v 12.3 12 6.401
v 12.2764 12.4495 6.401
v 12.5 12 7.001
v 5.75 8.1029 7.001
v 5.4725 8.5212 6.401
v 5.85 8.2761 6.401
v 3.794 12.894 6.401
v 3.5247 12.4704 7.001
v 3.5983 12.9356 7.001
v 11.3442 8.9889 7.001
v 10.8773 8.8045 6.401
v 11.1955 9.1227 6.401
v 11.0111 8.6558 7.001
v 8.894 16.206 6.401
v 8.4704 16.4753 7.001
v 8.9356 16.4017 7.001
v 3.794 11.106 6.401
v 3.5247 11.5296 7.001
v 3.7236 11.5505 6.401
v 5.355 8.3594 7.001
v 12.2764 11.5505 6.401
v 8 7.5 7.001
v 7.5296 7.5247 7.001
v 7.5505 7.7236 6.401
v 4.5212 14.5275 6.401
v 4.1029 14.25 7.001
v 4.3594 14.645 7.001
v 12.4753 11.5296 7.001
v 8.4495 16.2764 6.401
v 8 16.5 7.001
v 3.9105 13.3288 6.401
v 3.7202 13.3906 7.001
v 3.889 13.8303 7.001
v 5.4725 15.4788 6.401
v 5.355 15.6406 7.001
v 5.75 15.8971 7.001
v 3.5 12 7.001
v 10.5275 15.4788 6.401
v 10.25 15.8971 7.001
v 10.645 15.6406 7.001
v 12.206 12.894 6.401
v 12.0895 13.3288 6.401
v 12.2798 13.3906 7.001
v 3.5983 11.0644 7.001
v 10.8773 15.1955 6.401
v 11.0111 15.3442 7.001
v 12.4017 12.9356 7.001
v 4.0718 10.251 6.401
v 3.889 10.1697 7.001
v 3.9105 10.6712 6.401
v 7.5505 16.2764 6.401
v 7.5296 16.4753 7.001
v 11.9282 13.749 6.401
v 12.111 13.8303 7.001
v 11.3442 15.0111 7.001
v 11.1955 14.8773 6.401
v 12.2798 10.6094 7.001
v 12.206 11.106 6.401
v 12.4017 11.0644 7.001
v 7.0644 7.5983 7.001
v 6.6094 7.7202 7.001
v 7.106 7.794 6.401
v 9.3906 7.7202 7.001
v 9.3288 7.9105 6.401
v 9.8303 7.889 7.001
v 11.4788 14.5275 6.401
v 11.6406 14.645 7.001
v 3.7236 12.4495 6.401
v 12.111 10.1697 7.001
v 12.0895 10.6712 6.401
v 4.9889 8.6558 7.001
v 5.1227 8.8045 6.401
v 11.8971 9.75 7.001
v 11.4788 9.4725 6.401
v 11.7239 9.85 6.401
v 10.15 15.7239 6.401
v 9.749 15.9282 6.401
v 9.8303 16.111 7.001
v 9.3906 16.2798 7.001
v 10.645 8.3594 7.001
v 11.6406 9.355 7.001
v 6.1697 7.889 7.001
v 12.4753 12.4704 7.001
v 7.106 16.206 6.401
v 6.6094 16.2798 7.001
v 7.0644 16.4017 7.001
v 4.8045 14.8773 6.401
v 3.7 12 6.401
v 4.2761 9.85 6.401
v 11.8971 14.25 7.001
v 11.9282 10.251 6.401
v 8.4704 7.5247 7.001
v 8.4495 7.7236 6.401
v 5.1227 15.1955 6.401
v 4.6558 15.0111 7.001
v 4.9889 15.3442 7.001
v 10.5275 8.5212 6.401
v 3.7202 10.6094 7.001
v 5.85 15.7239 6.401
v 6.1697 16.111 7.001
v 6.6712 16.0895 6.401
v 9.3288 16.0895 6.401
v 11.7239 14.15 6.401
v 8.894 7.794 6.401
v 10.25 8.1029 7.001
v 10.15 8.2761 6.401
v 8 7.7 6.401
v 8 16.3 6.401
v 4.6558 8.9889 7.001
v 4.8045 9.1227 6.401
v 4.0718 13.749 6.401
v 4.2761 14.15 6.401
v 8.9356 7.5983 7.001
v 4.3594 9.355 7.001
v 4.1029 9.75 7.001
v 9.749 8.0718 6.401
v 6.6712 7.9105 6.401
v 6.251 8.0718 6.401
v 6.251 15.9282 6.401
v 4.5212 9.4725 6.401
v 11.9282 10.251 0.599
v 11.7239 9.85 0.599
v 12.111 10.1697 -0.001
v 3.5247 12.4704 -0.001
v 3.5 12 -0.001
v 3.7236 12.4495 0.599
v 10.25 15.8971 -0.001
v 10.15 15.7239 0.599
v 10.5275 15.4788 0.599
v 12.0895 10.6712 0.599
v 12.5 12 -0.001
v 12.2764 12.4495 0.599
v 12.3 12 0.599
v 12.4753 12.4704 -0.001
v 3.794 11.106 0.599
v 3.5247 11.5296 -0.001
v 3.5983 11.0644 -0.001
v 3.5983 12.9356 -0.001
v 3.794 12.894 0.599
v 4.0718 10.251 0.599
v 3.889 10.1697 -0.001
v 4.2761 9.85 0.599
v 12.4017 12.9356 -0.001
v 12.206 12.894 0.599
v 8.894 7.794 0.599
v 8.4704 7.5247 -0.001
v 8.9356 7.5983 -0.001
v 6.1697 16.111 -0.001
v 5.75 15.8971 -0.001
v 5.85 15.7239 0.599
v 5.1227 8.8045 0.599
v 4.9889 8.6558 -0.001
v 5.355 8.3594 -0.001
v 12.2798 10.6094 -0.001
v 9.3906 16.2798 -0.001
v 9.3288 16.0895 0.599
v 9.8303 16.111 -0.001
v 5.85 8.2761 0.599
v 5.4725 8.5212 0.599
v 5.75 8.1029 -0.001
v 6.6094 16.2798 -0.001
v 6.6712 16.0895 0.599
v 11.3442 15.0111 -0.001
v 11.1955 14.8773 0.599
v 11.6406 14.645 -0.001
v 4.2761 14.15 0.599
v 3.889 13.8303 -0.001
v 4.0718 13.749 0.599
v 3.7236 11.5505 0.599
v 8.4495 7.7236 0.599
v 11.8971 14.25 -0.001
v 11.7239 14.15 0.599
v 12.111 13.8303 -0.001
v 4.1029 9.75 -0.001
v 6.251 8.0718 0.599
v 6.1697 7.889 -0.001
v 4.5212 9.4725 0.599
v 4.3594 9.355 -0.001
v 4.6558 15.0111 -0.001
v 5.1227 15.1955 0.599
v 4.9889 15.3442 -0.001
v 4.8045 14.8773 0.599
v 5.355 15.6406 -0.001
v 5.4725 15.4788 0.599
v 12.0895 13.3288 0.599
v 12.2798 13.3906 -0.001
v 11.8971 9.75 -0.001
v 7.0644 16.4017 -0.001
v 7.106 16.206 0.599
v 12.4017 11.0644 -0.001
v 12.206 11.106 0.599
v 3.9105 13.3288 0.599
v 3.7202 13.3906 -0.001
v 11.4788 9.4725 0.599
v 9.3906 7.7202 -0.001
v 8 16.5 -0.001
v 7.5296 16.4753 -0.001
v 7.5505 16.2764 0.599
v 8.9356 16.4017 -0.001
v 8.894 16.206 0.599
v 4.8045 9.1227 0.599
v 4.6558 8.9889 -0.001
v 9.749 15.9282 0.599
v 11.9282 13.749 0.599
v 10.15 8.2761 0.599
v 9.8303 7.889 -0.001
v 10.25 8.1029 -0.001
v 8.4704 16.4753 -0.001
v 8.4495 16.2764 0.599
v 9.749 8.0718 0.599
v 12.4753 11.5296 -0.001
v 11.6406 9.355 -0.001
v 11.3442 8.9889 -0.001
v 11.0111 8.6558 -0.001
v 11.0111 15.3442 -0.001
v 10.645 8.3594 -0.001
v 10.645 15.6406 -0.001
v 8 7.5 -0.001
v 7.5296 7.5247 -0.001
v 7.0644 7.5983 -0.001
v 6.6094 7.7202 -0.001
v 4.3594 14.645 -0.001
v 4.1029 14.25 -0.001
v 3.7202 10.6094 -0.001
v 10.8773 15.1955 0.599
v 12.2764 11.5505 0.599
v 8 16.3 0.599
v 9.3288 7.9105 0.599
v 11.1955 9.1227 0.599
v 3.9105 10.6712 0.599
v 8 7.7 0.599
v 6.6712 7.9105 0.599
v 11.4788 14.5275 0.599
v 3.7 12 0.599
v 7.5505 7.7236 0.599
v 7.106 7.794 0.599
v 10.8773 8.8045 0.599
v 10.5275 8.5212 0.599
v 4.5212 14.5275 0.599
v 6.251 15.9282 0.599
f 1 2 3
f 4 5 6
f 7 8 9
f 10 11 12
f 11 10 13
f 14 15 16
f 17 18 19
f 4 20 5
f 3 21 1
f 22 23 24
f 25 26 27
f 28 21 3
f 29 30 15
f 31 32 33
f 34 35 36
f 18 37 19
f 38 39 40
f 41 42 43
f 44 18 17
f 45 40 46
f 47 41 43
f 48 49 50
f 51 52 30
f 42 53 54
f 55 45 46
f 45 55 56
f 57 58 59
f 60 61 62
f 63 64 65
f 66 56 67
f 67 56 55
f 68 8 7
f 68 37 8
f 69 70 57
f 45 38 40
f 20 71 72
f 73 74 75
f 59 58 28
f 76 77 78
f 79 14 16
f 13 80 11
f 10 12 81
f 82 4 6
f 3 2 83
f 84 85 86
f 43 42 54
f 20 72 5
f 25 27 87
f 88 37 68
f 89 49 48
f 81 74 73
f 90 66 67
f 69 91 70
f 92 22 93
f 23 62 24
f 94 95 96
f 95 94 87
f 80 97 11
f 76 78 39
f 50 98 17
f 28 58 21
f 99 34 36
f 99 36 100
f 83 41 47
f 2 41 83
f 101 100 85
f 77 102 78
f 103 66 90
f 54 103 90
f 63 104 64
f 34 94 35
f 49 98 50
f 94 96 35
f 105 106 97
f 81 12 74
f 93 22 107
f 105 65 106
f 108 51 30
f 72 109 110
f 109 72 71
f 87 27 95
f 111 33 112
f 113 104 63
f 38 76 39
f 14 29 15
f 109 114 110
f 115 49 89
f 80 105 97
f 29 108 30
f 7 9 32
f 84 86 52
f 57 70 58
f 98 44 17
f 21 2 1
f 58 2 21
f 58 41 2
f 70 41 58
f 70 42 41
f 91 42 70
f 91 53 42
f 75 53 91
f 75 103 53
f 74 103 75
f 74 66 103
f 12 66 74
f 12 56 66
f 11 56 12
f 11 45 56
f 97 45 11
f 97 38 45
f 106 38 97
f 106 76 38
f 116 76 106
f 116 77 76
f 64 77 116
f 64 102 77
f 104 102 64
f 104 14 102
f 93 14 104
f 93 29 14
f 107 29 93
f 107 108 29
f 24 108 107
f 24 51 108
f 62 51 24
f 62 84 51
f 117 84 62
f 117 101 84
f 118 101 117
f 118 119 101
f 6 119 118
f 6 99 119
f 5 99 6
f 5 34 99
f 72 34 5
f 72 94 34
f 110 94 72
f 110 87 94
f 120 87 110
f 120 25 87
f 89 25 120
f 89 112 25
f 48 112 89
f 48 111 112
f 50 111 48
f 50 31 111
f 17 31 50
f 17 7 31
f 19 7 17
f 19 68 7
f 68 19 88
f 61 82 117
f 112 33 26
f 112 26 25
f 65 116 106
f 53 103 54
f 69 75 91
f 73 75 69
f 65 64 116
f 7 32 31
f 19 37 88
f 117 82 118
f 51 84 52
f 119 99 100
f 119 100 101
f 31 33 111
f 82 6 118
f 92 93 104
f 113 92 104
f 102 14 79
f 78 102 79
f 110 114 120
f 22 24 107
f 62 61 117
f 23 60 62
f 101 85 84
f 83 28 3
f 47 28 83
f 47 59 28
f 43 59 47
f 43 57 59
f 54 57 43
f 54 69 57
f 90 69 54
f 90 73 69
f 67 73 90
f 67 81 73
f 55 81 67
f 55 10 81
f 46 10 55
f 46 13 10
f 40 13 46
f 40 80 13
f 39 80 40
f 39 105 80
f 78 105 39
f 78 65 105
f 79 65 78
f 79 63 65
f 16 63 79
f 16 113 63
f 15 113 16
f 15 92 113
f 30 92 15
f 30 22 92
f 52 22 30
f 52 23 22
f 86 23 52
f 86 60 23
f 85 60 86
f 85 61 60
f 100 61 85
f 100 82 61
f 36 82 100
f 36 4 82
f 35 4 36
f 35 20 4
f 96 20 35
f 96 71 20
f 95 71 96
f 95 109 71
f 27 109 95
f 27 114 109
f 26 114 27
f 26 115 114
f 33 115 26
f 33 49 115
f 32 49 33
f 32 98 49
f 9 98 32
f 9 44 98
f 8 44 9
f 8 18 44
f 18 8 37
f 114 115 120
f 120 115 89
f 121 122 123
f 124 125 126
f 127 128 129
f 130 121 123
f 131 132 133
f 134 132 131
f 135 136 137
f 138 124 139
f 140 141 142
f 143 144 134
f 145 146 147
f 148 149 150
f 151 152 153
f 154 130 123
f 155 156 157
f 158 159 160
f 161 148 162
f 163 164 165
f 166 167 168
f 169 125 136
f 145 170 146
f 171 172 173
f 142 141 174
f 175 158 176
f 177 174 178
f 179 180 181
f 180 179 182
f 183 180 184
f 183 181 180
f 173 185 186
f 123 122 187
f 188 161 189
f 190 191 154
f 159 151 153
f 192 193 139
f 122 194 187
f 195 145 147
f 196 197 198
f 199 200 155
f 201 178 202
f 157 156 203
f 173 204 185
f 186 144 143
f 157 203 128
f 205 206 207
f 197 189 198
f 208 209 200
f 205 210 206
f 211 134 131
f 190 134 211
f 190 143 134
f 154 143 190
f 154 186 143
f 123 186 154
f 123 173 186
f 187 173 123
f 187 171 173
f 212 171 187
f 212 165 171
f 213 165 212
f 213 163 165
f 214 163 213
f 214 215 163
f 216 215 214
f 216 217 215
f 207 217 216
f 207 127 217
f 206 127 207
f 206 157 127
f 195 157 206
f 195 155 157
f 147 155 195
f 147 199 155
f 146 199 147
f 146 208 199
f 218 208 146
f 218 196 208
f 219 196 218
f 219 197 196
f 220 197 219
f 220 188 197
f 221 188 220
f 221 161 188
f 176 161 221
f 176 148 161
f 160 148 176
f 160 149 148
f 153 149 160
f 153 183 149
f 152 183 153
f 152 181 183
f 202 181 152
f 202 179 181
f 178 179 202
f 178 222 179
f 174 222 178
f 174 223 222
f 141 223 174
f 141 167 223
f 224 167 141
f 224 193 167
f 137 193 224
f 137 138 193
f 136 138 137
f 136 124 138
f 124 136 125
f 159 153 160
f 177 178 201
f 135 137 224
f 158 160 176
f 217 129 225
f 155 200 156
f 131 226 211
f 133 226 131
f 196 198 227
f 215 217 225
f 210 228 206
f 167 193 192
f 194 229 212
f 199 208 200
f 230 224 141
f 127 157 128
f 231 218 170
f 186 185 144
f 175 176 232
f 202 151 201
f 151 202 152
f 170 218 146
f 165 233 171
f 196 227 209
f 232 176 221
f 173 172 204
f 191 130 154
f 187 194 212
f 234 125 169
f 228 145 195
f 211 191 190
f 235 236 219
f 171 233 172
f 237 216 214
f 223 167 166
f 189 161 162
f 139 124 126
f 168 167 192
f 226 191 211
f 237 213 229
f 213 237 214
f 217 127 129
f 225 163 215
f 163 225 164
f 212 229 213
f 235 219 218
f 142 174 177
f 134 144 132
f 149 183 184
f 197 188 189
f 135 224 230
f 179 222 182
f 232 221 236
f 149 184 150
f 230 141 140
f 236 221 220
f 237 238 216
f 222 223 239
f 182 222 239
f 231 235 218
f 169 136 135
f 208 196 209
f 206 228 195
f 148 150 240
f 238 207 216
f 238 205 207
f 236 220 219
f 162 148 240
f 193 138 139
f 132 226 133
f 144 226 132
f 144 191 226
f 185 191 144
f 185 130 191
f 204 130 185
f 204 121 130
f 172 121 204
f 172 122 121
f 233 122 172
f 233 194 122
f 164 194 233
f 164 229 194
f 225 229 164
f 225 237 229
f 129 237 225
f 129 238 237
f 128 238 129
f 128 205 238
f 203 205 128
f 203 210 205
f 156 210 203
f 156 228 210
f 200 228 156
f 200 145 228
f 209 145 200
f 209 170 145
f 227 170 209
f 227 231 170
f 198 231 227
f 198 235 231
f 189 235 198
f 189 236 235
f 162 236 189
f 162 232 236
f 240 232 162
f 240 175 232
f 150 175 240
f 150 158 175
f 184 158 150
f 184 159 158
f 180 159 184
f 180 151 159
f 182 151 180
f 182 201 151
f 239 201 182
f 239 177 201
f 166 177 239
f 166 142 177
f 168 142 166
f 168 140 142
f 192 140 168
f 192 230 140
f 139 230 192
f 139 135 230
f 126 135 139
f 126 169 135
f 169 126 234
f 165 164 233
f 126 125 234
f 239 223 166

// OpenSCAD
/*
"OpenScad library. Threads for screws and nuts V1" 
by ANDRES ROMAN (AKA Cuiso) September 2018

* Copyright 2018 ANDRES ROMAN (AKA Cuiso)
* Licensed under the Creative Commons - Attribution license.
* This software is free software, you can Share and Adapt under the terms of Attribution
(give appropriate credit).
*   
* you can visit https://creativecommons.org/licenses/by/3.0/ for more details

* This software is distributed WITHOUT ANY WARRANTY.

*/

//For use this library you can put the file threads-library-by-cuiso-v1.scad in the same directory of your proyect and put the line use <threads-library-by-cuiso-v1.scad> in your own .scad file
//You can see examples of use in file examples.scad

/*
This is a library to include threads for screws and nuts in your own designs.

This library is focused to provide simple functions with preset parameters by default,
and not to be too demanding in CPU consumption neither in previsualizacion nor in rendering

This library has been tested printing on PLA with 0.1 layer. Except for smaller diameter
threads layers greater than 0.1 should work well.
Diamaters tested between 3mm and 10mm, but you can use any diameter of your choice. 

Shape of the threads are similar (but not equal) to ISO METRIC threads.
Some tests have been done using screws and nuts printed with this library in
combination with screws and nuts of metal with acceptable results. However, they have
not been exhaustive tests.
*/

/*
>>>>>>>>>>>>>>>>>>>>>>>>>>>>>>>>>>>>>>>>>>>>>>>>>>>>>>
AVAILABLE FUNCTIONS:

BASIC FUNCTIONS (USING PREDEFINED PARAMETERS):

thread_for_screw(diameter, length);
    Generates a screw thread of the diameter indicated by the "diameter" parameter and of the length indicated by "length". This function uses standard pitch values depending on the diameter specified.
    diameter: Free value, in milimeters.
    length: Free value, in milimeters.
    
    Example:
    thread_for_screw(diameter=10, length=30);

module thread_for_nut(diameter, length, usrclearance=0);
    Generates a nut thread of the diameter indicated by the "diameter" parameter and of the length indicated by "length". This function uses standard pitch values depending on the diameter specified.
    The generated thread can be subtracted from any element of your design using the operator "difference()", thus obtaining a thread where a screw will fit.
    This function uses standard clearance for adjustment between screw and nut depending on the diameter specified.
    diameter: Free value, in milimeters.
    length: Free value, in milimeters.
    usrclearance: (optional) If the screw fits too tight on the nut you can specify a positive correction value (try 0.1 for example).
    If the screw fits too loose in the nut you can specify a negative correction value (try -0.1 for example).
    
    Example:
    thread_for_nut(diameter=10, length=20);
    

MORE AVAILABLE FUNCTIONS (WITH ADDITIONAL PARAMETERS):

thread_for_screw_fullparm(diameter, length, pitch, divs=50);
    Generates a screw thread of the diameter indicated by the "diameter" parameter and of the length indicated by "length", with pitch indicated by "pitch", and a resolution indicated by "divs". 
    This function allows you to specify a non-standard "pitch" value.
    diameter: Free value, in milimeters.
    length: Free value, in milimeters.
    pitch: Pitch value.
    divs: (optional) you can obtain more or less resolution with parm. Higher values for more resolution (and more rendering time). Default value is 50.
        
    Example:
    thread_for_screw_fullparm(diameter=10, length=30, pitch=2, divs=60);

thread_for_nut_fullparm(diameter, length, usrclearance=0, pitch, divs=50, entry=1);
    Generates a nut thread with additional parameters:
    diameter: Free value, in milimeters.
    length: Free value, in milimeters.
    usrclearance: (optional) If the screw fits too tight on the nut you can specify a positive correction value (try 0.1 for example).
    If the screw fits too loose in the nut you can specify a negative correction value (try -0.1 for example).
    pitch: Pitch value.
    divs: (optional) you can obtain more or less resolution with parm. Higher values for more resolution (and more rendering time). Default value is 50.
    entry: By default, the nut threads include a wider entrance area at the beginning and end to facilitate the introduction of the screw and minimize "elephant foot" problems.
    Specify 1 in entry to use these zones and 0 to not use them.
    
    Example:
    thread_for_nut_fullparm(diameter=10,length=20,usrclearance=0.1,pitch=1.5,divs=60, entry=1);
>>>>>>>>>>>>>>>>>>>>>>>>>>>>>>>>>>>>>>>>>>>>>>>>>>>>>>
*/   

/*
>>>>>>>>>>>>>>>>>>>>>>>>>>>>>>>>>>>>>>>>>>>>>>>>>>>>>>
SOME NOTES:
- At first preview(F5) of the design may appear in console a lot of messages:
"PolySet has nonplanar faces. Attempting alternate construction"
simply ignore those messages, they are not a problem.

- I have no lag problems in preview(F5) mode during the test of this library. If you are suffering lag problems in preview you can try to un-comment the "render()" al lines 250 and 255.  

- This library uses by default PITCH values: 
  DIAMETER    PITCH_VALUE
  3mm        0.5mm
  4mm        0.7mm
  5mm        0.8mm
  6mm        1.0mm
  8mm        1.25mm
 10mm        1.5mm
 ...
 24mm        3.0mm
 (complete list defined at get_std_pitch(diam))
>>>>>>>>>>>>>>>>>>>>>>>>>>>>>>>>>>>>>>>>>>>>>>>>>>>>>>
*/


//EXAMPLE FOR CUSTOMIZER:
//1 to draw rod, 0 to not draw rod
drawrod=1; 
//1 to draw nut, 0 to not draw nut
drawnut=1;
diameter=8; 
lengthrod=15; 
lengthnut=7; 
//Example of USE, a rod SCREW:
if(drawrod==1)thread_for_screw(diameter=diameter, length=lengthrod);
//Example of USE, a FEMALE THREAD to be removed (with difference ()) from another figure:
if(drawnut==1)
translate([diameter,1.5*diameter,0]){
thread_for_nut(diameter=diameter, length=lengthnut);
}




//>>>>>>>>>>>>>>>>>>>>>>>>>>>>>>>>>>>>>>>>>>>>>>>>>>>>>>>>>>>>>>>>>>>>>>>>>>>>>>>>>>>
module thread_for_screw(diameter, length)
{
stdpitch=get_std_pitch(diameter);
thread_for_screw_cuiso_tec(diameter,length,stdpitch,50);
echo(diameter);echo(stdpitch);
}

module thread_for_nut(diameter, length, usrclearance=0)
{
stdpitch=get_std_pitch(diameter);
stdclearance=get_std_clearance(diameter);

thread_for_nut_cuiso_tec
(diameter+stdclearance+usrclearance,length,stdpitch,50,entry=1);
    
echo(diameter);echo(stdpitch);echo(stdclearance+usrclearance);
}

//>>>>>>>>>>>>>>>>>>>>>>>>>>>>>>>>>>>>>>>>>>>>>>>>>>>>>>>>>>>>>>>>>>>>>>>>>>>>>>>>>>>
module thread_for_screw_fullparm(diameter, length, pitch, divs=50)
{
if(divs<20) thread_for_screw_cuiso_tec(diameter,length,pitch,20);
    else if(divs>360) thread_for_screw_cuiso_tec(diameter,length,pitch,360);
        else thread_for_screw_cuiso_tec(diameter,length,pitch,divs);
}

module thread_for_nut_fullparm(diameter, length, usrclearance=0, pitch, divs=50, entry=1)
{
stdclearance=get_std_clearance(diameter);

if(divs<20)thread_for_nut_cuiso_tec
(diameter+stdclearance+usrclearance,length,pitch,20,entry=entry);
else
if(divs>360)thread_for_nut_cuiso_tec
(diameter+stdclearance+usrclearance,length,pitch,360,entry=entry);
else
thread_for_nut_cuiso_tec
(diameter+stdclearance+usrclearance,length,pitch,divs,entry=entry);
}

//>>>>>>>>>>>>>>>>>>>>>>>>>>>>>>>>>>>>>>>>>>>>>>>>>>>>>>>>>>>>>>>>>>>>>>>>>>>>>>>>>>>
function get_std_pitch(diam) = 
lookup(diam,[[3,0.5],[4,0.7],[5,0.8],[6,1.0],[8,1.25],[10,1.5],
[12,1.75],[14,2.0],[16,2.0],[18,2.5],[20,2.5],[22,2.5],[24,3.0]
]);

function get_std_clearance(diam) = 
lookup(diam,[[3,0.4],[4,0.4],[5,0.5],[6,0.6],[8,0.6],[10,0.6],
[12,0.7],[14,0.7],[16,0.7],[18,0.7],[20,0.8],[22,0.8],[24,0.8]
]);
//>>>>>>>>>>>>>>>>>>>>>>>>>>>>>>>>>>>>>>>>>>>>>>>>>>>>>>>>>>>>>>>>>>>>>>>>>>>>>>>>>>>
module thread_for_screw_cuiso_tec(diameter,lenght,pitch,divdelta){
delta=360/divdelta;
intersection(){
cubointter(long=lenght,pitch=pitch,diameter=diameter);
rosca(long=lenght,p=pitch,delta=delta,diameter=diameter);
}
//#cylinder(d=diameter,h=lenght,$fn=100);
}

module thread_for_nut_cuiso_tec(diameter,lenght,pitch,divdelta,entry){
delta=360/divdelta;
translate([0,0,-0.001])
intersection(){
rosca(long=lenght+0.002,p=pitch,delta=delta,diameter=diameter,nut=1);
cubointter_nut(lenght+0.002,pitch,diameter);
}
if(entry==1){translate([0,0,-0.001])cubointter_nut_entry(lenght+0.002,pitch,diameter);}
//#cylinder(d=diameter,h=lenght,$fn=100);
}

module cubointter(long,pitch,diameter)
{
longcube=long-pitch;
translate([0,0,longcube/2+pitch/2])cube([diameter,diameter,longcube],center=true);
translate([0,0,longcube+pitch/2])
cylinder(d1=diameter,d2=diameter-2*pitch*0.866,h=pitch/2, $fn=60);
cylinder(d2=diameter,d1=diameter-2*pitch*0.866,h=pitch/2, $fn=60);
}

module cubointter_nut(long,pitch,diameter)
{
longcube=long;
translate([0,0,longcube/2])cube([diameter,diameter,longcube],center=true);
}

module cubointter_nut_entry(long,pitch,diameter)
{
longcube=long-0.6;
translate([0,0,longcube])
cylinder(d2=diameter+0.4,d1=diameter,h=0.6, $fn=60);
cylinder(d1=diameter+0.4,d2=diameter,h=0.6, $fn=60);
}

module rosca(long,p,delta,diameter,nut=0)
{
vueltas=round(long/p+0.5)+1;
translate([0,0,-p/4])
for(v = [0 : 1 : vueltas-1])
translate([0,0,v*p])
vuelta(p=p,delta=delta,diameter=diameter,nut=nut);
}

module vuelta(p,delta,diameter,nut)
{
medio(p=p,delta=delta,diameter=diameter,nut=nut);

translate([0,0.001,0])
rotate([0,180,180])
medio(p=p,delta=delta,diameter=diameter,nut=nut);
}

module medio(p,delta,diameter,nut)
{
if(nut==1)
//render()
hull()
for(k = [0 : delta : 180])
translate([0,0,k*p/360])rotate([0,0,k])pieza_nut(diameter=diameter, p=p);
else
//render()
hull()
for(k = [0 : delta : 180])
translate([0,0,k*p/360])rotate([0,0,k])pieza(diameter=diameter, p=p);
}

module pieza(diameter, p)
{
r=diameter/2;
h=p*0.866;
pp=p/2;
pm=-p/2;
hh=r-h;

polyhedron([
    [0,0,pp],[hh,0,pp],[r-h/8,0,p/16],[r-h/8,0,-p/16],[hh,0,pm],[0,0,pm]
    ], 
    [[0,1,2,3,4,5]]);
}

module pieza_nut(diameter, p)
{
r=diameter/2;
h=p*0.866;
pp=p/2;
pm=-p/2;
hh=r-h;
polyhedron([[0,0,pp],[hh,0,pp],[r,0,0],[hh,0,pm],[0,0,pm]], [[0,1,2,3,4]]);
}
